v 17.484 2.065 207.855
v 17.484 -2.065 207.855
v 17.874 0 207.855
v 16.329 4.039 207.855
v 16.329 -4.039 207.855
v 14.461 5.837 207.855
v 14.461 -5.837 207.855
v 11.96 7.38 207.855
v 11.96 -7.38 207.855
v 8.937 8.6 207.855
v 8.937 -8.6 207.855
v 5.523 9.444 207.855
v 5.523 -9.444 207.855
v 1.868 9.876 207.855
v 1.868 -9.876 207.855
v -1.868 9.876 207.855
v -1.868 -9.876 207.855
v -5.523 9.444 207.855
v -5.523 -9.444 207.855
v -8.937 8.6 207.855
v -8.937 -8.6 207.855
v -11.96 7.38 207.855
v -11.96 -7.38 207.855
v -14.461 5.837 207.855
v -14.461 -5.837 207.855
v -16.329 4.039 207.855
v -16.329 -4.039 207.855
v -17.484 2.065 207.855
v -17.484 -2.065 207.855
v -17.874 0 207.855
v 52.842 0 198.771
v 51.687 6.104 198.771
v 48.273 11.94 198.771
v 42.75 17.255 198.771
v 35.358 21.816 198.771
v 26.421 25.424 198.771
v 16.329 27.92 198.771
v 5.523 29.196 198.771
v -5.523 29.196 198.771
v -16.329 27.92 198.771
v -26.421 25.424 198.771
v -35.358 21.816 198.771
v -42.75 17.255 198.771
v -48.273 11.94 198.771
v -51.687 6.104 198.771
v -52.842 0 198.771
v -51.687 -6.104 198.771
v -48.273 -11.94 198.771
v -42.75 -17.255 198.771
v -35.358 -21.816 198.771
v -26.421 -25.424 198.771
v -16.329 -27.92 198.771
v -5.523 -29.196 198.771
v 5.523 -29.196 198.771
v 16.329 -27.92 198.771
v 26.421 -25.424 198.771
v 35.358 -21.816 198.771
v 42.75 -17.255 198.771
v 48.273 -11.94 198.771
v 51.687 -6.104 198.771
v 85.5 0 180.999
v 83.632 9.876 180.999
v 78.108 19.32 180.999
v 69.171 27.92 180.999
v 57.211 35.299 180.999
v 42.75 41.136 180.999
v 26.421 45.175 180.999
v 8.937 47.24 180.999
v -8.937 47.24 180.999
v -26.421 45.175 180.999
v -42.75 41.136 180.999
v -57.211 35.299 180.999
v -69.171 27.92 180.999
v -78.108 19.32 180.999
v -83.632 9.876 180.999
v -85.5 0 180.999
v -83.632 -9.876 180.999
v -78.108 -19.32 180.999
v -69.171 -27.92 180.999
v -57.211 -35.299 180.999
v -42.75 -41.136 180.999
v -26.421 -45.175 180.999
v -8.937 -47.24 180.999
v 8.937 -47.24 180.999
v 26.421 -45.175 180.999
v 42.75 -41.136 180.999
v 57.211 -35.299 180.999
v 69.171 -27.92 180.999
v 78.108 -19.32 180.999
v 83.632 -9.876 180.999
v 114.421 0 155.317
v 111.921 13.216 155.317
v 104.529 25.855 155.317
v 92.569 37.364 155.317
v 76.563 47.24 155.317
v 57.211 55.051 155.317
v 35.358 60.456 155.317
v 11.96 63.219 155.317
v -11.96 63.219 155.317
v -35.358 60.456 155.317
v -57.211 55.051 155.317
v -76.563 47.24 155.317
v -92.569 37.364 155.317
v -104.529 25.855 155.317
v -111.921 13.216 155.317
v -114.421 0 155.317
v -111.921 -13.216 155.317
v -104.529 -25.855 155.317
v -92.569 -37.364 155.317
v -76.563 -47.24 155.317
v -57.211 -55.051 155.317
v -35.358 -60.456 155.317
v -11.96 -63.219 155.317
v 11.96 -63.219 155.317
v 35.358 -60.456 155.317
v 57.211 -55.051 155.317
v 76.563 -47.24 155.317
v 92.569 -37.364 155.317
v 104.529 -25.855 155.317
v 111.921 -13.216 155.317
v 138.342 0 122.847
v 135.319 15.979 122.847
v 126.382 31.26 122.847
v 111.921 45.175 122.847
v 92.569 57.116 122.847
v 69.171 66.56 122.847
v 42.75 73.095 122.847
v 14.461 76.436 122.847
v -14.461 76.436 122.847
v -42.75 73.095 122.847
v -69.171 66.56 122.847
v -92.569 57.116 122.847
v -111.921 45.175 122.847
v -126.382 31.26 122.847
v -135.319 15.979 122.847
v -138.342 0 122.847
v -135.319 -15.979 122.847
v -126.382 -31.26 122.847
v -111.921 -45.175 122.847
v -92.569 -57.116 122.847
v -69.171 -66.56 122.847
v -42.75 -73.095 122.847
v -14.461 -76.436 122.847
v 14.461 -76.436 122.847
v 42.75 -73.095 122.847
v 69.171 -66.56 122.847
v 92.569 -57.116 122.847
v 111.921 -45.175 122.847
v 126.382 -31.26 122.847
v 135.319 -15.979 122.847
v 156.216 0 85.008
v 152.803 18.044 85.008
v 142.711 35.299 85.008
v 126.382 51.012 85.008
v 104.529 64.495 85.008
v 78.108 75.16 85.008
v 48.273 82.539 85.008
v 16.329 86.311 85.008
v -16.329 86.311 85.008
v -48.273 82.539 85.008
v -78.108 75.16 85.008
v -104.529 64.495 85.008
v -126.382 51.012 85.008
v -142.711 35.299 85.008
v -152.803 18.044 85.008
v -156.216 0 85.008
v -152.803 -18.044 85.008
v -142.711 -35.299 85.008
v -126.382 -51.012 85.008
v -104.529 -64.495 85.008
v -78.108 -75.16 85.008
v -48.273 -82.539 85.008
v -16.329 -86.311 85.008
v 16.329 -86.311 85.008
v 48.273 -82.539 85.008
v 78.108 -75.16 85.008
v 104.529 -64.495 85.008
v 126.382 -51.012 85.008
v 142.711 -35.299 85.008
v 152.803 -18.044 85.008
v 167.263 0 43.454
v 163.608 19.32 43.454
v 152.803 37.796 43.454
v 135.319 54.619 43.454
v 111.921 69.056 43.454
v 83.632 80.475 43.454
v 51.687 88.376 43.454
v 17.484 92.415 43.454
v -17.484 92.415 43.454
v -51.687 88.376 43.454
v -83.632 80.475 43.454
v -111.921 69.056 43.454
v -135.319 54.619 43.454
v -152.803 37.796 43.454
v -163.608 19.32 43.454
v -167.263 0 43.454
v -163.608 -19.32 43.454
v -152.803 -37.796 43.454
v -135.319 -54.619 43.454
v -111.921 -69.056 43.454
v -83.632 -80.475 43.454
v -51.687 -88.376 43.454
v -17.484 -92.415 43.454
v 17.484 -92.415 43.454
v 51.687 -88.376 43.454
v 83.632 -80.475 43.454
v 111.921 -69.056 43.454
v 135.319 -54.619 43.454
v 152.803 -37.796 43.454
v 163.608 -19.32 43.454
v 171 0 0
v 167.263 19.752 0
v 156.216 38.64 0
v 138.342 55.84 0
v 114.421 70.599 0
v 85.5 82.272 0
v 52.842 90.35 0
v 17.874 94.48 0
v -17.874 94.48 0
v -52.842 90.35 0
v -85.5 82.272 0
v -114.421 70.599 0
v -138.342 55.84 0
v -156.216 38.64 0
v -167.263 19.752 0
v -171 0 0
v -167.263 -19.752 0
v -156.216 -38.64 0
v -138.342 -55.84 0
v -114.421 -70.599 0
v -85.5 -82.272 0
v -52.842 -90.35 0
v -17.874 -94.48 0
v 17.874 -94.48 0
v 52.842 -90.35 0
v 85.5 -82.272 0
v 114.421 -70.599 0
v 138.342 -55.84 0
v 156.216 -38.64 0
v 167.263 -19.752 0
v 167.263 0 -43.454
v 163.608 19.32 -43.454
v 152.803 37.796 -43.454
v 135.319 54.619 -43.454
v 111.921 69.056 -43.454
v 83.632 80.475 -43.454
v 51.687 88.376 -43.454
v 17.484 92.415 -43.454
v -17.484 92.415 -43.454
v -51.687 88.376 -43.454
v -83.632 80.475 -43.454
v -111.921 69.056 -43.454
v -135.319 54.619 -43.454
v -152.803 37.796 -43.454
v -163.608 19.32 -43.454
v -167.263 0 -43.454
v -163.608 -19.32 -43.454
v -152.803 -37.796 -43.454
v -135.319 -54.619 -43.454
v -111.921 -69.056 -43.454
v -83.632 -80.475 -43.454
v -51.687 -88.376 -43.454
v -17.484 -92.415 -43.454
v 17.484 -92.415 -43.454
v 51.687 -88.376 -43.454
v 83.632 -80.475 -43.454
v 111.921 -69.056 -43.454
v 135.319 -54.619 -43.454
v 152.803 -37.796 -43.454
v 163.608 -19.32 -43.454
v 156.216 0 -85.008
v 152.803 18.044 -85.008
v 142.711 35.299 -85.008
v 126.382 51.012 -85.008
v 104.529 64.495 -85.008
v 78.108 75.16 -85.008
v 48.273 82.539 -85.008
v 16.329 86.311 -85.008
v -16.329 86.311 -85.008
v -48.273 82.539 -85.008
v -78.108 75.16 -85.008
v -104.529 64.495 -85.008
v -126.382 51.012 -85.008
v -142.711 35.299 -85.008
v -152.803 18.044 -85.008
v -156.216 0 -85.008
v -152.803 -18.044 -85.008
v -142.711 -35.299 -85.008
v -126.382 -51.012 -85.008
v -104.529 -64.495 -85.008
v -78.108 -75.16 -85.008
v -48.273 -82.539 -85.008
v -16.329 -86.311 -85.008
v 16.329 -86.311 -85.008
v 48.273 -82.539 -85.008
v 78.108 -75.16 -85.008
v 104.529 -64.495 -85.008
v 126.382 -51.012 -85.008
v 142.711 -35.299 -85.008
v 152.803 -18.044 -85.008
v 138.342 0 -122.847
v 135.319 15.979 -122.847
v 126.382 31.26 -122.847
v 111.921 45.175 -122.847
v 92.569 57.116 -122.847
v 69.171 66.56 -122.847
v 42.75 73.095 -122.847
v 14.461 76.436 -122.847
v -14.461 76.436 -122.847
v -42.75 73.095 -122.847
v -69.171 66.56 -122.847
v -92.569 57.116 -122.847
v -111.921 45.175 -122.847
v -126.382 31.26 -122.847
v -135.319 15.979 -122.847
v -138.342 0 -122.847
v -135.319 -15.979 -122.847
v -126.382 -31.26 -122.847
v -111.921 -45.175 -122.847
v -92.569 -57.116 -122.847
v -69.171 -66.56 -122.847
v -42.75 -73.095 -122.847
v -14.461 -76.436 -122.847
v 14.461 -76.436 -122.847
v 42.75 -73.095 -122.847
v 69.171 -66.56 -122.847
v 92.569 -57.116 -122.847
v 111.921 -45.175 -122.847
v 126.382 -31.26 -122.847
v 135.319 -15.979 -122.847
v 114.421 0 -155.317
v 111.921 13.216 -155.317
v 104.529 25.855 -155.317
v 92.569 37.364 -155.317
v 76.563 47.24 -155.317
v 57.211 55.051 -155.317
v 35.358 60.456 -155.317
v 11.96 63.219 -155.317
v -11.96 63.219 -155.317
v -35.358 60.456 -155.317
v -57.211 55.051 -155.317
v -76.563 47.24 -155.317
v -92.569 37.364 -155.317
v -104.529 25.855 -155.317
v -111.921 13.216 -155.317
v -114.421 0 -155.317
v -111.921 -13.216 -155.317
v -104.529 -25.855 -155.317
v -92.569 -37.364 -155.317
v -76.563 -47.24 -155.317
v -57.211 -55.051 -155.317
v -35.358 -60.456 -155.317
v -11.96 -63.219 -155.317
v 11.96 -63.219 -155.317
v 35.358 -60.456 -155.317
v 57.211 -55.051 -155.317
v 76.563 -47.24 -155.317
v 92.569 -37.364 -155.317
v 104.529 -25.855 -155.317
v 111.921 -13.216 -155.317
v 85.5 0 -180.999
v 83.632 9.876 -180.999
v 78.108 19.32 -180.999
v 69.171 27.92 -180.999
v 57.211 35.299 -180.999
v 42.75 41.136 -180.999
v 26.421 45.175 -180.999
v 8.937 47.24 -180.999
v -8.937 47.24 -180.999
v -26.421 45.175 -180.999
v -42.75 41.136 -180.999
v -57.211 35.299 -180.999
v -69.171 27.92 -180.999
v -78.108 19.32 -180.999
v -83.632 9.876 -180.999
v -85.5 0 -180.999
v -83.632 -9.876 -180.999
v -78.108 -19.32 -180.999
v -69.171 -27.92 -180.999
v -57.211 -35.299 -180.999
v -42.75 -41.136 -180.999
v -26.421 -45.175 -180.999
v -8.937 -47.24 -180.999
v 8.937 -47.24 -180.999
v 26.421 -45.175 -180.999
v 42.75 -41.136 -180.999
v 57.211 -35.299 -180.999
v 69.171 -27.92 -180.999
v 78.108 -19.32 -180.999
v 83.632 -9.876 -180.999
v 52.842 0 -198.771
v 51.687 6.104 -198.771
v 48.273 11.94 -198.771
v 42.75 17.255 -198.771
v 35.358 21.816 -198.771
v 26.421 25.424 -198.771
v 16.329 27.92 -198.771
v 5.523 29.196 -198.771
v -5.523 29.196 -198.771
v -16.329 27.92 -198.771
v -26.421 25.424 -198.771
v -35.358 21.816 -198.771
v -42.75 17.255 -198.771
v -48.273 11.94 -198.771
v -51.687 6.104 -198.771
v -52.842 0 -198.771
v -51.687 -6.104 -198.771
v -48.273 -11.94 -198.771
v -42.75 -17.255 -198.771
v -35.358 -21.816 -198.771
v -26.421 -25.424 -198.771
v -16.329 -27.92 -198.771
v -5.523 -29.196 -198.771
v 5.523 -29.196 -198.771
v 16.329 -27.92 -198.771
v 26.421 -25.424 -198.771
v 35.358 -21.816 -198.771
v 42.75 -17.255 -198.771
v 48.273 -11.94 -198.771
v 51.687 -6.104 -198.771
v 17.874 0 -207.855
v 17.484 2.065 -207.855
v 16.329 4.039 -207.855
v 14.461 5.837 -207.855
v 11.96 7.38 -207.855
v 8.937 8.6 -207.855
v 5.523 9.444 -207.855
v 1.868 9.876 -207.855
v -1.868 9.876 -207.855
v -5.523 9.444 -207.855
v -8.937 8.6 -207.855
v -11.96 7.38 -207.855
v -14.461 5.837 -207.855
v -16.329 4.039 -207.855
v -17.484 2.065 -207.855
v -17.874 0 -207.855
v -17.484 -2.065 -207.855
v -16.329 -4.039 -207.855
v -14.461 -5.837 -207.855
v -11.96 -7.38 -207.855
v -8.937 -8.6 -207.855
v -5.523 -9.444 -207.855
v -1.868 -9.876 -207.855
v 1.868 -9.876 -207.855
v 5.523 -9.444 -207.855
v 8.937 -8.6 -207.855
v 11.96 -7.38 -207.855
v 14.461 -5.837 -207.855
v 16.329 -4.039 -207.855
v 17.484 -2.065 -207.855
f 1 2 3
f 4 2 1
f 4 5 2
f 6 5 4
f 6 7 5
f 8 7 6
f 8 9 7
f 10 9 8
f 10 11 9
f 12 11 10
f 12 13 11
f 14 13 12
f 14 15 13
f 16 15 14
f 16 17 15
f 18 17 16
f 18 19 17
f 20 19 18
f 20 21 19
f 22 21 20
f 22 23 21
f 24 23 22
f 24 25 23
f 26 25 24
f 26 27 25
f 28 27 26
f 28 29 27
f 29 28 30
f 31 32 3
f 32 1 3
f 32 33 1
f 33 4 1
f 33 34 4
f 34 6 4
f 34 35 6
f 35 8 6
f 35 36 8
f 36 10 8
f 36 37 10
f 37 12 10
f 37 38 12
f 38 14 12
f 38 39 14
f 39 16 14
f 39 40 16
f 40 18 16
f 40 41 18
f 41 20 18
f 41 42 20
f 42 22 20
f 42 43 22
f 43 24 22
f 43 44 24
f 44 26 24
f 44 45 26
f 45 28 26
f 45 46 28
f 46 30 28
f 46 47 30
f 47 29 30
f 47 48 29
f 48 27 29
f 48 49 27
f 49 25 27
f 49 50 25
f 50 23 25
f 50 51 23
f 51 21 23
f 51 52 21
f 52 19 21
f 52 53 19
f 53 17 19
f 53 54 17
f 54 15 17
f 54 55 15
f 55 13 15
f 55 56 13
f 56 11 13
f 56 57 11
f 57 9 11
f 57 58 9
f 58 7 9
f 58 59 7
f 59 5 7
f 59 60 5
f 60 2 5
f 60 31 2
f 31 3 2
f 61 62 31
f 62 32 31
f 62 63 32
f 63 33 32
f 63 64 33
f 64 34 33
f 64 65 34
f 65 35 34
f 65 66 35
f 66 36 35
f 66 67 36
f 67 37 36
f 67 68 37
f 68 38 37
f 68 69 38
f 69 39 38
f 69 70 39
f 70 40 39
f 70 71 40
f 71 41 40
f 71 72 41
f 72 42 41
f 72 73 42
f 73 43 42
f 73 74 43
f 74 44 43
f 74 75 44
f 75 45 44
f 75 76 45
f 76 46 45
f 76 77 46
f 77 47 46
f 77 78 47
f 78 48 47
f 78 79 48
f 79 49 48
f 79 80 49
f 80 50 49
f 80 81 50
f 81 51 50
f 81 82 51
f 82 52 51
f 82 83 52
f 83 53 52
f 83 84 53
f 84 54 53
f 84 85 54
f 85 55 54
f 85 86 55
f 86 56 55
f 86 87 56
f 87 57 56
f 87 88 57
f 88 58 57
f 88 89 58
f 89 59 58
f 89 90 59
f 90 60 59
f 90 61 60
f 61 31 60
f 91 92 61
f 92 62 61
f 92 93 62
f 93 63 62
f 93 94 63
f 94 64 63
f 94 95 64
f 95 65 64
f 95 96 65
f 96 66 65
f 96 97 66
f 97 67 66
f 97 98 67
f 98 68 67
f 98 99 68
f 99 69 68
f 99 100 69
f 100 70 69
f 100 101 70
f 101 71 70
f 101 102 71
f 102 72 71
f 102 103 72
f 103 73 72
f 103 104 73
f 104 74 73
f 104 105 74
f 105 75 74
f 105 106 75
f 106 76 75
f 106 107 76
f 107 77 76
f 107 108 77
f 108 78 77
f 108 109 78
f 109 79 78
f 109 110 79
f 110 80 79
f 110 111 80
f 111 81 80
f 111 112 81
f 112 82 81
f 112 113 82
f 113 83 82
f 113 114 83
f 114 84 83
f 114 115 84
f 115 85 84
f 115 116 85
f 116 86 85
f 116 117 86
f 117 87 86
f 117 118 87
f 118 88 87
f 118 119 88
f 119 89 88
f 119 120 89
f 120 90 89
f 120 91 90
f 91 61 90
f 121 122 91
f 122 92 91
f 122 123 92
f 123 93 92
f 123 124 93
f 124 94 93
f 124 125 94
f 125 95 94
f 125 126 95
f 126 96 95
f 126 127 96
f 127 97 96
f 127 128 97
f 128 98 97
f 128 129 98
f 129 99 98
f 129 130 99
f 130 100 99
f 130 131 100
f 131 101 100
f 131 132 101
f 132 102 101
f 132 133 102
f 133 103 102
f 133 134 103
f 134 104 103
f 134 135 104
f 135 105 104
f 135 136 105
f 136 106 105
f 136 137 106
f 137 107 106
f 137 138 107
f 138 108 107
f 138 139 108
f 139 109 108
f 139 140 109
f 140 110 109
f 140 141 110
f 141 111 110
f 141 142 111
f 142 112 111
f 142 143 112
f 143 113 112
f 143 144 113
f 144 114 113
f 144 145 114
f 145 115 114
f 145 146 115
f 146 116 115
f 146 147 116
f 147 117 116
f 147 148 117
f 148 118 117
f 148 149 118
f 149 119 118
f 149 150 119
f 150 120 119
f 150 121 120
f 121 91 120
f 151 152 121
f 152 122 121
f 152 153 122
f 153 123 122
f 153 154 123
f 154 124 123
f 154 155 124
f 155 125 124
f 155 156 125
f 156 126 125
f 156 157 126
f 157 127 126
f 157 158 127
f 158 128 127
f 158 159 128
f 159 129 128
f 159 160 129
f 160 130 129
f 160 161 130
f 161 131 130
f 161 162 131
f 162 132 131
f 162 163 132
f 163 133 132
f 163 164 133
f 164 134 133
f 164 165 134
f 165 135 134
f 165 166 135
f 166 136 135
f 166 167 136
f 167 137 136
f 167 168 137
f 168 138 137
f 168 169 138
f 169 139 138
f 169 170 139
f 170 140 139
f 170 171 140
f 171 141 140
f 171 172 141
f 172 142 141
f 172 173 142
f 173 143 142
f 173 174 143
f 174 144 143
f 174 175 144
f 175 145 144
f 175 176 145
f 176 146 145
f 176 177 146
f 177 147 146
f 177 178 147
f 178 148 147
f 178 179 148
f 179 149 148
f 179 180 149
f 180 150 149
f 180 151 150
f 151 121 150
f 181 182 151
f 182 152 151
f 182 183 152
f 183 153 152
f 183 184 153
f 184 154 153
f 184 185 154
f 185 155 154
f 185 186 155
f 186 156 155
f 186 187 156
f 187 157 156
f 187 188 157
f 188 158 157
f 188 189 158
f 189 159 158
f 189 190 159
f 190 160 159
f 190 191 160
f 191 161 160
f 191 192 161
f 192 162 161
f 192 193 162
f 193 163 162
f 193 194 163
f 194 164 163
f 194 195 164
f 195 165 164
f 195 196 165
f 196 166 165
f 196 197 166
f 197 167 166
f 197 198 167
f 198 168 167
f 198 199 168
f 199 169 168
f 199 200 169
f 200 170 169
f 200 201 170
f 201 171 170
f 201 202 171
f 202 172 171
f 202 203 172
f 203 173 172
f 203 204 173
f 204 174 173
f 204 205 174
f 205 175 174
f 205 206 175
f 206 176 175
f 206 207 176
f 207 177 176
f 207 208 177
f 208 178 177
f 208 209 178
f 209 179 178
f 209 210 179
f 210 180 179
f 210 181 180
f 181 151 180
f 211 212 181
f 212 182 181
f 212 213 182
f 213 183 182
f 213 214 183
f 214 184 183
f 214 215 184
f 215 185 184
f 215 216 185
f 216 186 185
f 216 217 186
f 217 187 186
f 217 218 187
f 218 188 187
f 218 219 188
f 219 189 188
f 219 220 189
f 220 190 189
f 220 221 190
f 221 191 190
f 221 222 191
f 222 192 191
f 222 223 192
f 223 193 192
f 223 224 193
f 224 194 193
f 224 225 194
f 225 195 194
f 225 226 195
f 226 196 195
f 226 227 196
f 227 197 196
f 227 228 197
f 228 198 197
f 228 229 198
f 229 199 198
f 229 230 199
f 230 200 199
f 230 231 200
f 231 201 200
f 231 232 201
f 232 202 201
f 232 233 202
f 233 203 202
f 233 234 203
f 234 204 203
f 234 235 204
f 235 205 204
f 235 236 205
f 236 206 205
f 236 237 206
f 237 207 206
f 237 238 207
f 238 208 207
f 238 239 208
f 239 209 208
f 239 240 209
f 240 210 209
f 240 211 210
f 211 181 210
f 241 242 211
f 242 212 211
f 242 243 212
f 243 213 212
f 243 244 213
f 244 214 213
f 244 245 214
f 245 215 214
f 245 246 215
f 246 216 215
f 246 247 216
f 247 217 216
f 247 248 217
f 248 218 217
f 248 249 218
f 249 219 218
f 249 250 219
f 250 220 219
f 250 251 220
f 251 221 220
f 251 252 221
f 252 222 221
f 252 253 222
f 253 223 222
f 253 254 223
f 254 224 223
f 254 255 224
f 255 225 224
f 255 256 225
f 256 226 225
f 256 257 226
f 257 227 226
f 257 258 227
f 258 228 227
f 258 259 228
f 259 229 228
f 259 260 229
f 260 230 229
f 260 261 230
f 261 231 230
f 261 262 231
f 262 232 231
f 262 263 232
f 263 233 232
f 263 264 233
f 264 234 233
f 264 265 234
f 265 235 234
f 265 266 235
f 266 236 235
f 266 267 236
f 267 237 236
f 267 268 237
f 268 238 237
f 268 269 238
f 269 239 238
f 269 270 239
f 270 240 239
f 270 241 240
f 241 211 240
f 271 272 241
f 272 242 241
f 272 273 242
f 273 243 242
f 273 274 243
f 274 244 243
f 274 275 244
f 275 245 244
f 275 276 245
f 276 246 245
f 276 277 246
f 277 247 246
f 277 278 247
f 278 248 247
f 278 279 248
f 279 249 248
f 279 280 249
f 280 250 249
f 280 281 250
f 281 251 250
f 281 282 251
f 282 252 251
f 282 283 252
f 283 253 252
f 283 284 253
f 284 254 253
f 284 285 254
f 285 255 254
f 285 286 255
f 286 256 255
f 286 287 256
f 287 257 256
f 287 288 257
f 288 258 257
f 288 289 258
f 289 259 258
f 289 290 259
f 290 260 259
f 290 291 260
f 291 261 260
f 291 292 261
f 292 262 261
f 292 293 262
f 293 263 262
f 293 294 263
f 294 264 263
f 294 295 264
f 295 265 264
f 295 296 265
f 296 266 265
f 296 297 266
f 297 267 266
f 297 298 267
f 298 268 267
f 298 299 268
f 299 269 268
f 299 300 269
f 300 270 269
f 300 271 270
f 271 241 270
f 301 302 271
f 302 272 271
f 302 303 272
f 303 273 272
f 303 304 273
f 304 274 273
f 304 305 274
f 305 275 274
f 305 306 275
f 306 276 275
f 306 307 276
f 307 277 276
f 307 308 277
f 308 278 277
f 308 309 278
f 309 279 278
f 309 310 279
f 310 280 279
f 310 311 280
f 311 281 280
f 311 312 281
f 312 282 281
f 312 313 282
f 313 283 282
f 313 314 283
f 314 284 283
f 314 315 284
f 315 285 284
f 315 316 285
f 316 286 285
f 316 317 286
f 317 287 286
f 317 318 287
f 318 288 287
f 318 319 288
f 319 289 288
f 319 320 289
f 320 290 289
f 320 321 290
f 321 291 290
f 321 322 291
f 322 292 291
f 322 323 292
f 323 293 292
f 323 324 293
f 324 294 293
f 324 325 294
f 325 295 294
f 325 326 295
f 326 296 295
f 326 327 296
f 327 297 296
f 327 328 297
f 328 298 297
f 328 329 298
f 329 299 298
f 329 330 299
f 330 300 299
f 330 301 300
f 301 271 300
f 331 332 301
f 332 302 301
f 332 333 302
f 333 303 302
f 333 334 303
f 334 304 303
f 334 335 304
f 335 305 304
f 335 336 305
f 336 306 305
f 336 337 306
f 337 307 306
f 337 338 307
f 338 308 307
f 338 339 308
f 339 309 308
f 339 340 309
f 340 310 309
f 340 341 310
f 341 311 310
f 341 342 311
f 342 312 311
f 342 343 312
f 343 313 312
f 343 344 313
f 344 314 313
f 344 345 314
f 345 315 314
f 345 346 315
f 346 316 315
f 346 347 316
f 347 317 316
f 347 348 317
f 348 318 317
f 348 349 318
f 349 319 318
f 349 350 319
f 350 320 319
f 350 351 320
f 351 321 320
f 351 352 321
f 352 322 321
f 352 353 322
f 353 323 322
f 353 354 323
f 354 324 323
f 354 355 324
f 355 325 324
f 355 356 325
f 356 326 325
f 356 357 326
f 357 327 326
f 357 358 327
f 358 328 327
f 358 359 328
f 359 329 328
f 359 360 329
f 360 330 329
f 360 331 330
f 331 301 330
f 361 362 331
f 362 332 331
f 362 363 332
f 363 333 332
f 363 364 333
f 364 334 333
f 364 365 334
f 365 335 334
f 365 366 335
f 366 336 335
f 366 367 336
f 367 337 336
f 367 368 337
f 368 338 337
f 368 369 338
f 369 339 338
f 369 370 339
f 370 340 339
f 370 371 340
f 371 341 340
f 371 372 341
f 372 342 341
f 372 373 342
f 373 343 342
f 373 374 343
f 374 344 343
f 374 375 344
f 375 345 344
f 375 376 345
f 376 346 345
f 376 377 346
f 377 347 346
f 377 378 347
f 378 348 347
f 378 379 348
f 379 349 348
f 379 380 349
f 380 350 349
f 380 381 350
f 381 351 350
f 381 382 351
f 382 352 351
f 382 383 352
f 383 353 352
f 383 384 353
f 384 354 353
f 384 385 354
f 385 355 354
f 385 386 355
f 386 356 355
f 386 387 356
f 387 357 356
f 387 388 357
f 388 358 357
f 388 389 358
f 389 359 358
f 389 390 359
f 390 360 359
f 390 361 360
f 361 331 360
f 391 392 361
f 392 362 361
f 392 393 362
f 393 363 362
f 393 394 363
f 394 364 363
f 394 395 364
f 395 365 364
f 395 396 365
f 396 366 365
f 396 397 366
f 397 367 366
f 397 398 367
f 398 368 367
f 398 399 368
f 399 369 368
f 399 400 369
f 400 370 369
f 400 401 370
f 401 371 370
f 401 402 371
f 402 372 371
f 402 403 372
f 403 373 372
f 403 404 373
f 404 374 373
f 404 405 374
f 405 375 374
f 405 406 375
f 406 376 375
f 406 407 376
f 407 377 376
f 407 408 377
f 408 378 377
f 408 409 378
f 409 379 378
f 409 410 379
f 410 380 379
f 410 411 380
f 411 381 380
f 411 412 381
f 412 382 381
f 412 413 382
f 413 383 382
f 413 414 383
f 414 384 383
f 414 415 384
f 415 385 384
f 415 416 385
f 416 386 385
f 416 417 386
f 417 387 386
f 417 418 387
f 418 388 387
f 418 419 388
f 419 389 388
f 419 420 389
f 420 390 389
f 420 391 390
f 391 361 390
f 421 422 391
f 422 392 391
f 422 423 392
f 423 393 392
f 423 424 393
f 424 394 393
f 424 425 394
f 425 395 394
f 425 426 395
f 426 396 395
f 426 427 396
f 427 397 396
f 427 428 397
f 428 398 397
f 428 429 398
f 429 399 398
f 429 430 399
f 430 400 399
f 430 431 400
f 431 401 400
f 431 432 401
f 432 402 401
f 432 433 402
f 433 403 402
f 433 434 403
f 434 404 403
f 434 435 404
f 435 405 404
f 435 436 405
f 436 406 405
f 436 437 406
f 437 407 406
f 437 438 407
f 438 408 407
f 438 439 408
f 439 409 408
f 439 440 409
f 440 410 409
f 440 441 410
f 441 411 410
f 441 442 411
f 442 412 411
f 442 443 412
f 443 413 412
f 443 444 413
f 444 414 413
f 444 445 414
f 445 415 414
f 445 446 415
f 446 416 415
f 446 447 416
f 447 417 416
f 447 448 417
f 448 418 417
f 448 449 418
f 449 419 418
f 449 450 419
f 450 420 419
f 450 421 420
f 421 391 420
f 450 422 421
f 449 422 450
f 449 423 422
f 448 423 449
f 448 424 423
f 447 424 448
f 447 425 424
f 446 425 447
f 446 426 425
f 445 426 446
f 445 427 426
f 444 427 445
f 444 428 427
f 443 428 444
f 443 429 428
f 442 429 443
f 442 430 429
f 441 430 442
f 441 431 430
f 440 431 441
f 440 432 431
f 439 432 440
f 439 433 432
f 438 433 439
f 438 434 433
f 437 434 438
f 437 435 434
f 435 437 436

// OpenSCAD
// Generated by SolidPython 1.0.1 on 2020-07-29 00:46:48


scale(v = [9, 5, 11]) {
	sphere(r = 19);
}
/***********************************************
*********      SolidPython code:      **********
************************************************
 
# import packages: SolidPython
from solid import *
from solid.utils import *
from itertools import chain, combinations, permutations


class Resize:

    def __init__(self, scad_file):
        self.scad_file = scad_file
        #self.scad_file = import_scad(scad_file)
        # cone/cylinder param:
        self.r1 = 0
        self.r2 = 0
        self.h = 0
        # rectangular prism param:
        self.w = 0
        self.l = 0
        # ellipse param:
        self.r = 0

    # import OpenScad code (file name corresponds to shape)


    # classify shape + parameters
    def assign(self, param1, param2, param3):
        if self.scad_file == 'cone.scad':
            self.r1 = param1
            self.r2 = param2
            self.h = param3
        elif self.scad_file == 'cylinder.scad':
            self.r1 = param1
            self.r2 = param2
            self.h = param3
        elif self.scad_file == 'rectangularPrism.scad':
            self.h = param1
            self.l = param2
            self.w = param3
        else:
            self.r = param1
            self.h = param2

    # resize parameters
    def iterate(self):
        x = range(3, 20, 2)
        i = 1
        if self.scad_file == 'cone.scad':
            tempList = list(permutations(x, 2))
            for temp in tempList:
                param1 = temp[0]
                param2 = temp[1]
                filepath = 'produced_scad_files/' + 'cone' + str(param1) + '_' + str(param2) + '_' + '.scad'
                scad_render_to_file(cylinder(h=param1, r1=param2, r2=0), filepath)

        elif self.scad_file == 'cylinder.scad':
            tempList = list(permutations(x, 3))
            for temp in tempList:
                param1 = temp[0]
                param2 = temp[1]
                filepath = 'produced_scad_files/' + 'cylinder' + str(param1) + '_' + str(param2) + '_' + '.scad'
                scad_render_to_file(cylinder(h=param1, r1=param2, r2=param2), filepath)

        elif self.scad_file == 'rectangularPrism.scad':
            tempList = list(permutations(x, 3))
            for temp in tempList:
                param1 = temp[0]
                param2 = temp[1]
                param3 = temp[2]
                filepath = 'produced_scad_files/' + 'rectangularPrism' + str(param1) + '_' + str(param2) + '_' + str(
                    param3) + '.scad'
                scad_render_to_file(cube(size=(param1, param2, param3)), filepath)

        elif self.scad_file == 'ellipse.scad':
            tempList = list(permutations(x, 4))
            for temp in tempList:
                param1 = temp[0]
                param2 = temp[1]
                param3 = temp[2]
                param4 = temp[3]
                filepath = 'produced_scad_files/' + 'ellipse' + str(param1) + '_' + str(param2) + '_' + str(param3) + '_' + str(param4) + '.scad'
                scad_render_to_file(scale([param1, param2, param3])(sphere(r=param4)), filepath)

    def render_to_scadfile(self):
        scad_render_to_file(scad, 'example.scad') 
 
************************************************/
